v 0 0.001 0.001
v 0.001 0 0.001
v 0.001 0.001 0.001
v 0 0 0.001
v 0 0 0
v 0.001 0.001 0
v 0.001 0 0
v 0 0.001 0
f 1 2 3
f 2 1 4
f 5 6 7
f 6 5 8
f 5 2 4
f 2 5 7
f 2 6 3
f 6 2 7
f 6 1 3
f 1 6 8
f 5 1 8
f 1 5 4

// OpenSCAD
// file: ../modules/body.scad
// modules/body.scad
include <insert.scad>

module outer_body_follow(insert_top_d, insert_bottom_d, insert_height,
                          ledge_engagement_height, fit_clearance, body_clearance,
                          bottom_margin, floor_thickness, wall_thickness, fn=50) {
    pot_height = insert_cavity_height(insert_height, floor_thickness, bottom_margin);
    insert_bottom_z = pot_height - insert_height;
    ledge_bottom_z  = pot_height - ledge_engagement_height;

    // Same breakpoints insert_cavity() uses, each offset outward by wall_thickness.
    // The cavity profile is piecewise linear between these z values, so linear
    // interpolation between exact-breakpoint points here is exact everywhere,
    // not just at sampled points.
    r_floor        = cavity_radius_at(floor_thickness, insert_top_d, insert_bottom_d,
                                       insert_height, ledge_engagement_height, fit_clearance,
                                       body_clearance, pot_height) + wall_thickness;
    r_insert_bot   = cavity_radius_at(insert_bottom_z, insert_top_d, insert_bottom_d,
                                       insert_height, ledge_engagement_height, fit_clearance,
                                       body_clearance, pot_height) + wall_thickness;
    r_ledge_lower  = cavity_radius_at(ledge_bottom_z, insert_top_d, insert_bottom_d,
                                       insert_height, ledge_engagement_height, fit_clearance,
                                       body_clearance, pot_height) + wall_thickness;
    r_ledge_upper  = insert_top_d/2 + fit_clearance + wall_thickness;

    pts = [
        [0, 0],
        [r_floor, 0],
        [r_floor, floor_thickness],
        [r_insert_bot, insert_bottom_z],
        [r_ledge_lower, ledge_bottom_z],
        [r_ledge_upper, ledge_bottom_z],
        [r_ledge_upper, pot_height],
        [0, pot_height]
    ];
    rotate_extrude($fn=fn) polygon(pts);
}

module outer_body_custom(outer_top_d, outer_bottom_d, outer_height, pot_height, fn=50) {
    assert(outer_height >= pot_height,
        str("outer_height (", outer_height, ") must be >= required cavity height (", pot_height, ")"));
    pts = [
        [0, 0],
        [outer_bottom_d/2, 0],
        [outer_top_d/2, outer_height],
        [0, outer_height]
    ];
    rotate_extrude($fn=fn) polygon(pts);
}
// file: ../modules/insert.scad
// modules/insert.scad
function _lerp(a, b, t) = a + (b - a) * t;

function insert_cavity_height(insert_height, floor_thickness, bottom_margin) =
    insert_height + floor_thickness + bottom_margin;

function cavity_radius_at(z, insert_top_d, insert_bottom_d, insert_height,
                           ledge_engagement_height, fit_clearance, body_clearance,
                           pot_height) =
    let(
        insert_bottom_z = pot_height - insert_height,
        ledge_bottom_z  = pot_height - ledge_engagement_height
    )
    z <= insert_bottom_z ? insert_bottom_d/2 + body_clearance :
    z <= ledge_bottom_z  ? _lerp(insert_bottom_d/2, insert_top_d/2,
                                  (z - insert_bottom_z) / (ledge_bottom_z - insert_bottom_z))
                            + body_clearance :
    insert_top_d/2 + fit_clearance;

module insert_cavity(insert_top_d, insert_bottom_d, insert_height,
                      ledge_engagement_height, fit_clearance, body_clearance,
                      bottom_margin, floor_thickness, overshoot=20, fn=50) {
    pot_height = insert_cavity_height(insert_height, floor_thickness, bottom_margin);
    ledge_bottom_z = pot_height - ledge_engagement_height;
    r_bottom      = cavity_radius_at(floor_thickness, insert_top_d, insert_bottom_d,
                                      insert_height, ledge_engagement_height,
                                      fit_clearance, body_clearance, pot_height);
    r_ledge_lower = cavity_radius_at(ledge_bottom_z, insert_top_d, insert_bottom_d,
                                      insert_height, ledge_engagement_height,
                                      fit_clearance, body_clearance, pot_height);
    r_ledge_upper = insert_top_d/2 + fit_clearance;

    pts = [
        [0, floor_thickness],
        [r_bottom, floor_thickness],
        [r_bottom, pot_height - insert_height],
        [r_ledge_lower, ledge_bottom_z],
        [r_ledge_upper, ledge_bottom_z],
        [r_ledge_upper, pot_height + overshoot],
        [0, pot_height + overshoot]
    ];
    rotate_extrude($fn=fn) polygon(pts);
}
// main file
// tests/test_body.scad
include <../modules/insert.scad>
include <../modules/body.scad>

// custom mode must reject an outer_height shorter than the required cavity height
// (assert() inside outer_body_custom is exercised via render, not directly testable
//  as a boolean here, so we test the underlying math path instead:)
pot_h = insert_cavity_height(130, 3, 5); // 138
assert(pot_h == 138);

// follow-insert outer radius at the rim must equal cavity radius + wall_thickness
r = cavity_radius_at(138, 150, 110, 130, 8, 0.3, 3, 138) + 2.4;
assert(r == 150/2 + 0.3 + 2.4, str("expected 77.7, got ", r));

cube(0.001);
